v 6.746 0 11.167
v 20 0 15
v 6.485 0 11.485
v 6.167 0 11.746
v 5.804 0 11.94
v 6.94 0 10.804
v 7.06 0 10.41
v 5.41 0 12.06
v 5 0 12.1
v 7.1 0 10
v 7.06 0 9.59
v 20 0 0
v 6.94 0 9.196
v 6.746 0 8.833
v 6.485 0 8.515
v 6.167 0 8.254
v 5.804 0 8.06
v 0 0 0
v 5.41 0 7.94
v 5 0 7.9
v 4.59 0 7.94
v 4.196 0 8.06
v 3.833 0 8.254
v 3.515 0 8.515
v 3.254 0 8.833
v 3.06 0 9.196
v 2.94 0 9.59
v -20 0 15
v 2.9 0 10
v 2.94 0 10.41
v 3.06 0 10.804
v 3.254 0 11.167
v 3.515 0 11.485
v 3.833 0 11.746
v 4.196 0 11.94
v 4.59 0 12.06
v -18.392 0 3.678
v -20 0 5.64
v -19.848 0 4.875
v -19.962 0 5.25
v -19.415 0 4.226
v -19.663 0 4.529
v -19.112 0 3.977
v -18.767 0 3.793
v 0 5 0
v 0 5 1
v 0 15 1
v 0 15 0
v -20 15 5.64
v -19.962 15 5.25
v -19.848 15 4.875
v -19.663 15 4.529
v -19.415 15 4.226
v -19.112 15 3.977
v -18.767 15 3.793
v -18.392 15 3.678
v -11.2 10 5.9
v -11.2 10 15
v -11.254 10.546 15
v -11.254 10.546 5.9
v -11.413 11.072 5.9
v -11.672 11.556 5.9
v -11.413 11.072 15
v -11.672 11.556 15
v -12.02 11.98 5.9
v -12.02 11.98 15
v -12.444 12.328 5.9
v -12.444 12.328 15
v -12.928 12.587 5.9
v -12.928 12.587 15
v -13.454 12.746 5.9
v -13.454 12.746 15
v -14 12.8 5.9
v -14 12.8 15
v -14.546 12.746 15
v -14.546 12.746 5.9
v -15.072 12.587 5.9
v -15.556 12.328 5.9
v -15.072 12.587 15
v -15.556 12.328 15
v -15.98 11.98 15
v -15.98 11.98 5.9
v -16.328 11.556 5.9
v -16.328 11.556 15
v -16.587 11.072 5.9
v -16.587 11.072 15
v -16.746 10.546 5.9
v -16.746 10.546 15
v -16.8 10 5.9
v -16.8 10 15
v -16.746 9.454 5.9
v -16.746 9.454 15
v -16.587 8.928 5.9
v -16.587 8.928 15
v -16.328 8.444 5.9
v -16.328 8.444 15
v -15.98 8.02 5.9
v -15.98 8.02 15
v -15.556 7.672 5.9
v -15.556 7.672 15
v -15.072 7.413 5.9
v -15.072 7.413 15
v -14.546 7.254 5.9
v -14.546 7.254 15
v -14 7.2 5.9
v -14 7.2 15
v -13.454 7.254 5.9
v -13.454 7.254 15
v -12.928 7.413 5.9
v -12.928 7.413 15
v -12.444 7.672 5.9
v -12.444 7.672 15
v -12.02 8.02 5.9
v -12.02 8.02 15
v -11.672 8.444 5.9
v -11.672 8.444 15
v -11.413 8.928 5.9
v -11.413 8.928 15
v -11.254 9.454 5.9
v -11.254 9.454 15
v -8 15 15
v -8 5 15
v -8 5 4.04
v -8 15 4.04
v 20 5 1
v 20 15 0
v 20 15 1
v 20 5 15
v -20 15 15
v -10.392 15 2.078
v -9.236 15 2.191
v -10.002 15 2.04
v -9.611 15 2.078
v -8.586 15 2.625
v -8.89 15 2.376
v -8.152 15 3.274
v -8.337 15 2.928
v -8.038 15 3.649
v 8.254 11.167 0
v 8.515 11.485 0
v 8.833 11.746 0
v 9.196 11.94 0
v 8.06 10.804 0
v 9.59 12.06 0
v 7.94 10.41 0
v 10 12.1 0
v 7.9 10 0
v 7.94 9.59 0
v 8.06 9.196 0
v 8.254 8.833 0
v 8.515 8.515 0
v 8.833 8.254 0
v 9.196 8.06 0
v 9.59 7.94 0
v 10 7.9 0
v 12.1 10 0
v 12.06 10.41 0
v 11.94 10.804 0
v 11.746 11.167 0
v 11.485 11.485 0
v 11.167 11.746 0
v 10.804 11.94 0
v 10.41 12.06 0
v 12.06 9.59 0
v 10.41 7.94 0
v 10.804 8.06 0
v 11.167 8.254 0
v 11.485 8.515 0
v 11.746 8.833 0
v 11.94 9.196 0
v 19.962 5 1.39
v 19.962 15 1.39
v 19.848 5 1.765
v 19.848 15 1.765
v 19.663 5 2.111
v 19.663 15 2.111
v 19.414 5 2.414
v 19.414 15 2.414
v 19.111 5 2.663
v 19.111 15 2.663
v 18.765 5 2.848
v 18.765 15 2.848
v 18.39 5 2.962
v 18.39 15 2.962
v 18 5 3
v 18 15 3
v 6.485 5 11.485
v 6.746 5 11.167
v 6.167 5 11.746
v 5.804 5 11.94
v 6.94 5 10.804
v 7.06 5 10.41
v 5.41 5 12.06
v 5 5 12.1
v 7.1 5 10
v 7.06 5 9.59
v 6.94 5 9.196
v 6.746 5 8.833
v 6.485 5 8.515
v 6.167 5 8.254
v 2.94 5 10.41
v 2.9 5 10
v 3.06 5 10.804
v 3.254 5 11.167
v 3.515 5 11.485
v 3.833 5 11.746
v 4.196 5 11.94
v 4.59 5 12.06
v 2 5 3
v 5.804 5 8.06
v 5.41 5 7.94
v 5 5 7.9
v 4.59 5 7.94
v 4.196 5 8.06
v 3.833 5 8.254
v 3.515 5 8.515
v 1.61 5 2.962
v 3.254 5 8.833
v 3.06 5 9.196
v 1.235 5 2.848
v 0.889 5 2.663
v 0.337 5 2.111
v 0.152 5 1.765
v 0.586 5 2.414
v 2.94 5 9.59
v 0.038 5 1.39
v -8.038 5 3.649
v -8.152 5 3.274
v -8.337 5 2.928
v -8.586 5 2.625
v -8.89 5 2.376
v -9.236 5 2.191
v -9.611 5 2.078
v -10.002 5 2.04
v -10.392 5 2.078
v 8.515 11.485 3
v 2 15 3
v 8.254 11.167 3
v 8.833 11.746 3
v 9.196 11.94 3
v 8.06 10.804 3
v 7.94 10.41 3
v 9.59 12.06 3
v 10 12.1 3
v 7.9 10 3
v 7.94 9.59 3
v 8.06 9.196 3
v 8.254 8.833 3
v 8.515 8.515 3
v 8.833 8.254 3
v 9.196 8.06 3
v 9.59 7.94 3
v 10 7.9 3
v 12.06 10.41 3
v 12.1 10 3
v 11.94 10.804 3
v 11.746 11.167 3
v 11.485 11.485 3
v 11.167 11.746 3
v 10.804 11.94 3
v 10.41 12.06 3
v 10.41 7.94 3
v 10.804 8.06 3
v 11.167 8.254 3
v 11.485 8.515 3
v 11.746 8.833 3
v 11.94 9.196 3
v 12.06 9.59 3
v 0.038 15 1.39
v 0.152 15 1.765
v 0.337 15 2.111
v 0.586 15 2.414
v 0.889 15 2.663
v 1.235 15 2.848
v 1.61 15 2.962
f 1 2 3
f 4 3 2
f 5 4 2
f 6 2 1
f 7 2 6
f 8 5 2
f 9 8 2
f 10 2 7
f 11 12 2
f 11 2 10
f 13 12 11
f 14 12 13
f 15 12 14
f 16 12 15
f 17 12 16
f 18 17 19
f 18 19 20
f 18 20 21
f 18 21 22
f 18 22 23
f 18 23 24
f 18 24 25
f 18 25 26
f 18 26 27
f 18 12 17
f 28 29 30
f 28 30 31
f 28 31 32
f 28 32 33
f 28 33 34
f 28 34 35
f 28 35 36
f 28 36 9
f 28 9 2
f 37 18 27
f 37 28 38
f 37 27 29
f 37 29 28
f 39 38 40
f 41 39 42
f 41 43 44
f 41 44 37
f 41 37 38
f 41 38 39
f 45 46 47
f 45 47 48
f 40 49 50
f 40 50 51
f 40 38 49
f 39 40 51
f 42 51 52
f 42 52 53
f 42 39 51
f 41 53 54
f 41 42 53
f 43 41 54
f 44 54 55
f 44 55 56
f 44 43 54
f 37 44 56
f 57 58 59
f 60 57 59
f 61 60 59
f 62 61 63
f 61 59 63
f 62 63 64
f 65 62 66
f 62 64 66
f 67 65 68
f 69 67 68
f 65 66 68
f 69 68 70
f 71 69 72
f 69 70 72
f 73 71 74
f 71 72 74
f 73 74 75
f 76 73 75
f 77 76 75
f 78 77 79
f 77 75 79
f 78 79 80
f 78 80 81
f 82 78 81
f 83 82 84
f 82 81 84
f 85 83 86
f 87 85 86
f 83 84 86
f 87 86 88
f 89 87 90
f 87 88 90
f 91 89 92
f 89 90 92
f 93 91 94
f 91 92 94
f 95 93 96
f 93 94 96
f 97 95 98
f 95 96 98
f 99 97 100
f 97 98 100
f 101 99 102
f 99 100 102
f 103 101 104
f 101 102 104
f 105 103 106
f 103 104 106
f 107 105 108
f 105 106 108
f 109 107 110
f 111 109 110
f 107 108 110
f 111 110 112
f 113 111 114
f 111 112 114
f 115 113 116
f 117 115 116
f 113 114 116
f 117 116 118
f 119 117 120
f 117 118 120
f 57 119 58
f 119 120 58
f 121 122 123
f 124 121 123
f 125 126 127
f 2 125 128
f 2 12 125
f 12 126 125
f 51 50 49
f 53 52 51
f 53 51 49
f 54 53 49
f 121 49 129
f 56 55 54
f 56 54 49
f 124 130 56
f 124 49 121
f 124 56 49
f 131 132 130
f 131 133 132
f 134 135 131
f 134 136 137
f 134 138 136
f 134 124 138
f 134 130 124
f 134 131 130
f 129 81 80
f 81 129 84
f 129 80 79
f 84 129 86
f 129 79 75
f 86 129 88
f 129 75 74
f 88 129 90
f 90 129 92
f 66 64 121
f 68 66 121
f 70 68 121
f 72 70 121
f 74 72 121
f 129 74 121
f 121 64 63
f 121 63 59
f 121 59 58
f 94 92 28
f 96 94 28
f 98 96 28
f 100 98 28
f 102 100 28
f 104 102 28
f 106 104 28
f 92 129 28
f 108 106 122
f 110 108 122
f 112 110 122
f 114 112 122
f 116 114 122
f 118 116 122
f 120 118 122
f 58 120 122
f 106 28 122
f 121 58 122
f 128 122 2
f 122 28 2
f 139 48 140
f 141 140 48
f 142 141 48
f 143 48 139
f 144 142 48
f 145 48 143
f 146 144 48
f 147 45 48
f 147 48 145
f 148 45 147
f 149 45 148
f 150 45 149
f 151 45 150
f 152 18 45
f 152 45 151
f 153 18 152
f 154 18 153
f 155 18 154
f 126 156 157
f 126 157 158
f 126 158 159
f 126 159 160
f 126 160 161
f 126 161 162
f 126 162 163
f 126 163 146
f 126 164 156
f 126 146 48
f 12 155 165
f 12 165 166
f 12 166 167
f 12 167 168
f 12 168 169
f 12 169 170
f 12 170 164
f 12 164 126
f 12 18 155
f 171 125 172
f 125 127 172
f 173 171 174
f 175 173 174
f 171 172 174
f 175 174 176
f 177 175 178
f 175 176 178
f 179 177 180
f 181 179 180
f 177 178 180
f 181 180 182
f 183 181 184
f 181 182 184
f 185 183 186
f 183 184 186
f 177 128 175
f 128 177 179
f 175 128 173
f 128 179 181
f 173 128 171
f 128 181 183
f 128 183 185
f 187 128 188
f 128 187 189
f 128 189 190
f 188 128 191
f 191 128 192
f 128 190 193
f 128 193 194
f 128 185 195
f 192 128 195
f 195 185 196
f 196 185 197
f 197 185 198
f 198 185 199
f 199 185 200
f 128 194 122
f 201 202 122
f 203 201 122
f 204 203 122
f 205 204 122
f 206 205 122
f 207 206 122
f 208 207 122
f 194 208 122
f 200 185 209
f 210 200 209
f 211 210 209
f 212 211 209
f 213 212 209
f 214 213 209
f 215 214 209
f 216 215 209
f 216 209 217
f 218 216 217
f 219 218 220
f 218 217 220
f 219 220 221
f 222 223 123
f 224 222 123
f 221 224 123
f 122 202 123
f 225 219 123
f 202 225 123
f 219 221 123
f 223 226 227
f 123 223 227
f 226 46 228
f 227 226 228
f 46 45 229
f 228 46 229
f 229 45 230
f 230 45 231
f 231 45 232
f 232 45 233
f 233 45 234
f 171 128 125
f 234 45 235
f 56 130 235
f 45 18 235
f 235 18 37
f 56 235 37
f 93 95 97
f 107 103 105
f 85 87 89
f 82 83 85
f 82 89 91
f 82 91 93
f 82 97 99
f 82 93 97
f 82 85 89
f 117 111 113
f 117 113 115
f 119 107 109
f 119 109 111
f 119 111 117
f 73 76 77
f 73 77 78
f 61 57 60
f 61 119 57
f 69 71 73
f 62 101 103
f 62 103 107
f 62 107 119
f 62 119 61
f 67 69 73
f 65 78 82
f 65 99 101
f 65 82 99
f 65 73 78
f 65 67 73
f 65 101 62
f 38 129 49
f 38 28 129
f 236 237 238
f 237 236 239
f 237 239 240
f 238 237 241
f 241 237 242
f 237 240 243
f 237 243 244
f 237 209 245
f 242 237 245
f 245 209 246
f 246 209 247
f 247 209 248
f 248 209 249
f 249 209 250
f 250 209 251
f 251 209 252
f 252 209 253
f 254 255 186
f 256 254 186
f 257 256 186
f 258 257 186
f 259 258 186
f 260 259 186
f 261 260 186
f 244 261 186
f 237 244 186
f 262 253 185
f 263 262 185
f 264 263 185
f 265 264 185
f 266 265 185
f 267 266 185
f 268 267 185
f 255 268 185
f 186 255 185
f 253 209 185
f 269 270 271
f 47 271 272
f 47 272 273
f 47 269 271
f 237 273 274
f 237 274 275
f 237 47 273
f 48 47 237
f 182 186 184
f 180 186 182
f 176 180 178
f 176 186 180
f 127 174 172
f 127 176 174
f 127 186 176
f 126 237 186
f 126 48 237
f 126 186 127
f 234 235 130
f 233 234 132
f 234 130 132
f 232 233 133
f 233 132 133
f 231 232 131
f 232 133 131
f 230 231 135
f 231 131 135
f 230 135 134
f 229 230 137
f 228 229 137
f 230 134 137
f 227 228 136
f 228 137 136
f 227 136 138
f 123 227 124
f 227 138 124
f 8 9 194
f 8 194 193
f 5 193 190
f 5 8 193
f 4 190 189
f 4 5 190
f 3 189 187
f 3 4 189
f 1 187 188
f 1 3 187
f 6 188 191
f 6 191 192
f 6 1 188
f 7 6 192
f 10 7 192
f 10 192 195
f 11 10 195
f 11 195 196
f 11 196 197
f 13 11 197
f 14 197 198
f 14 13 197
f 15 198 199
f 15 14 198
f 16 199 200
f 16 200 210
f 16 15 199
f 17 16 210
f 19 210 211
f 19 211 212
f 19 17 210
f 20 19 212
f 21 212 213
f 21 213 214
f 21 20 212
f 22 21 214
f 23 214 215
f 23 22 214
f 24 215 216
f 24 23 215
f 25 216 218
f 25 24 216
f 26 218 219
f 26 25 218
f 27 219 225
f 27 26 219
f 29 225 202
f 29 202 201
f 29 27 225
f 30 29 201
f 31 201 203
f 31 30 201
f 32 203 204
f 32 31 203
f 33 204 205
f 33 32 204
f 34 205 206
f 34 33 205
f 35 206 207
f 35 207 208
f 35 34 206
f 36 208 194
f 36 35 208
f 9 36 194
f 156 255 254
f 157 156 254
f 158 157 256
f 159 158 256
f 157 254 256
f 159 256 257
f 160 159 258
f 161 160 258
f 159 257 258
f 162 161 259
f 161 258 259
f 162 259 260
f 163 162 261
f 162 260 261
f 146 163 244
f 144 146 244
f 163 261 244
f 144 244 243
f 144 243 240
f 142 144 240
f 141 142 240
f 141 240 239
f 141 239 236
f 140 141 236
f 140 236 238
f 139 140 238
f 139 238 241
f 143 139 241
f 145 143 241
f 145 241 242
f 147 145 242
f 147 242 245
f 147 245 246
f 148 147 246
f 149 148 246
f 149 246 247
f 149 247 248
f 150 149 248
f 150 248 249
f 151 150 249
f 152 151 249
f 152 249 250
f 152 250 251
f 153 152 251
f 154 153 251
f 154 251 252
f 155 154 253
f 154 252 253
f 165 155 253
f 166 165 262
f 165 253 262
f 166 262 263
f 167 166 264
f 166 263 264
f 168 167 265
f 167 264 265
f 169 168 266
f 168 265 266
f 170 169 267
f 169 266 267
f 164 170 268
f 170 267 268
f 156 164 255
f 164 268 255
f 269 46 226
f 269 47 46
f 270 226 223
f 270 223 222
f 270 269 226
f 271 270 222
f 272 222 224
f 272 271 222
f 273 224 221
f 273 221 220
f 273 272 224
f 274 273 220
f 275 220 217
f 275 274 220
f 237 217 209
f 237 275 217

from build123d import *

# Parameters (mm, degrees)
ESQUISSE1_R             = 2.1
BOSS_EXTRU_1_DEPTH      = 5
ESQUISSE2_W             = 20
ESQUISSE2_H             = 3
BOSS_EXTRU_2_DEPTH      = 10
ESQUISSE3_R             = 2.8
ENL_V_MAT_EXTRU_1_DEPTH = 9.1
ESQUISSE4_R             = 2.1
ENL_V_MAT_EXTRU_2_DEPTH = 9.1
CONG_2_R                = 2


with BuildPart() as part:
    # Esquisse1 → Boss.-Extru.1 (new body)
    with BuildSketch(Plane(origin=(0, 0, 0), x_dir=(1, 0, 0), z_dir=(0, 1, 0))):
        Polygon((20, 0), (20, -15), (-20, -15), (-20, -4), (0, 0), align=None)
        with Locations((5, -10)):
            Circle(ESQUISSE1_R, mode=Mode.SUBTRACT)
    extrude(amount=BOSS_EXTRU_1_DEPTH)

    # Esquisse2 → Boss.-Extru.2 (add)
    with BuildSketch(Plane(origin=(0, 5, 0), x_dir=(1, 0, 0), z_dir=(0, 1, 0))):
        with Locations((10, -1.5)):
            Rectangle(ESQUISSE2_W, ESQUISSE2_H)
        Polygon((-8, -1.6), (-20, -4), (-20, -15), (-8, -15), align=None)
    extrude(amount=BOSS_EXTRU_2_DEPTH)

    # Esquisse3 → Enlèv. mat.-Extru.1 (cut)
    with BuildSketch(Plane.XY.offset(15)):
        with Locations((-14, 10)):
            Circle(ESQUISSE3_R)
    extrude(amount=-ENL_V_MAT_EXTRU_1_DEPTH, mode=Mode.SUBTRACT)

    # Esquisse4 → Enlèv. mat.-Extru.2 (cut)
    with BuildSketch(Plane.XY.offset(3)):
        with Locations((10, 10)):
            Circle(ESQUISSE4_R)
    extrude(amount=-ENL_V_MAT_EXTRU_2_DEPTH, mode=Mode.SUBTRACT)

    # Congé2
    cong_2_edges = [part.edges().sort_by_distance(p)[0] for p in [
        (20, 10, 3),
        (0, 10, 3),
        (-20, 7.5, 4),
        (-8, 10, 1.6),
    ]]
    fillet(cong_2_edges, radius=CONG_2_R)


solid = part.part
